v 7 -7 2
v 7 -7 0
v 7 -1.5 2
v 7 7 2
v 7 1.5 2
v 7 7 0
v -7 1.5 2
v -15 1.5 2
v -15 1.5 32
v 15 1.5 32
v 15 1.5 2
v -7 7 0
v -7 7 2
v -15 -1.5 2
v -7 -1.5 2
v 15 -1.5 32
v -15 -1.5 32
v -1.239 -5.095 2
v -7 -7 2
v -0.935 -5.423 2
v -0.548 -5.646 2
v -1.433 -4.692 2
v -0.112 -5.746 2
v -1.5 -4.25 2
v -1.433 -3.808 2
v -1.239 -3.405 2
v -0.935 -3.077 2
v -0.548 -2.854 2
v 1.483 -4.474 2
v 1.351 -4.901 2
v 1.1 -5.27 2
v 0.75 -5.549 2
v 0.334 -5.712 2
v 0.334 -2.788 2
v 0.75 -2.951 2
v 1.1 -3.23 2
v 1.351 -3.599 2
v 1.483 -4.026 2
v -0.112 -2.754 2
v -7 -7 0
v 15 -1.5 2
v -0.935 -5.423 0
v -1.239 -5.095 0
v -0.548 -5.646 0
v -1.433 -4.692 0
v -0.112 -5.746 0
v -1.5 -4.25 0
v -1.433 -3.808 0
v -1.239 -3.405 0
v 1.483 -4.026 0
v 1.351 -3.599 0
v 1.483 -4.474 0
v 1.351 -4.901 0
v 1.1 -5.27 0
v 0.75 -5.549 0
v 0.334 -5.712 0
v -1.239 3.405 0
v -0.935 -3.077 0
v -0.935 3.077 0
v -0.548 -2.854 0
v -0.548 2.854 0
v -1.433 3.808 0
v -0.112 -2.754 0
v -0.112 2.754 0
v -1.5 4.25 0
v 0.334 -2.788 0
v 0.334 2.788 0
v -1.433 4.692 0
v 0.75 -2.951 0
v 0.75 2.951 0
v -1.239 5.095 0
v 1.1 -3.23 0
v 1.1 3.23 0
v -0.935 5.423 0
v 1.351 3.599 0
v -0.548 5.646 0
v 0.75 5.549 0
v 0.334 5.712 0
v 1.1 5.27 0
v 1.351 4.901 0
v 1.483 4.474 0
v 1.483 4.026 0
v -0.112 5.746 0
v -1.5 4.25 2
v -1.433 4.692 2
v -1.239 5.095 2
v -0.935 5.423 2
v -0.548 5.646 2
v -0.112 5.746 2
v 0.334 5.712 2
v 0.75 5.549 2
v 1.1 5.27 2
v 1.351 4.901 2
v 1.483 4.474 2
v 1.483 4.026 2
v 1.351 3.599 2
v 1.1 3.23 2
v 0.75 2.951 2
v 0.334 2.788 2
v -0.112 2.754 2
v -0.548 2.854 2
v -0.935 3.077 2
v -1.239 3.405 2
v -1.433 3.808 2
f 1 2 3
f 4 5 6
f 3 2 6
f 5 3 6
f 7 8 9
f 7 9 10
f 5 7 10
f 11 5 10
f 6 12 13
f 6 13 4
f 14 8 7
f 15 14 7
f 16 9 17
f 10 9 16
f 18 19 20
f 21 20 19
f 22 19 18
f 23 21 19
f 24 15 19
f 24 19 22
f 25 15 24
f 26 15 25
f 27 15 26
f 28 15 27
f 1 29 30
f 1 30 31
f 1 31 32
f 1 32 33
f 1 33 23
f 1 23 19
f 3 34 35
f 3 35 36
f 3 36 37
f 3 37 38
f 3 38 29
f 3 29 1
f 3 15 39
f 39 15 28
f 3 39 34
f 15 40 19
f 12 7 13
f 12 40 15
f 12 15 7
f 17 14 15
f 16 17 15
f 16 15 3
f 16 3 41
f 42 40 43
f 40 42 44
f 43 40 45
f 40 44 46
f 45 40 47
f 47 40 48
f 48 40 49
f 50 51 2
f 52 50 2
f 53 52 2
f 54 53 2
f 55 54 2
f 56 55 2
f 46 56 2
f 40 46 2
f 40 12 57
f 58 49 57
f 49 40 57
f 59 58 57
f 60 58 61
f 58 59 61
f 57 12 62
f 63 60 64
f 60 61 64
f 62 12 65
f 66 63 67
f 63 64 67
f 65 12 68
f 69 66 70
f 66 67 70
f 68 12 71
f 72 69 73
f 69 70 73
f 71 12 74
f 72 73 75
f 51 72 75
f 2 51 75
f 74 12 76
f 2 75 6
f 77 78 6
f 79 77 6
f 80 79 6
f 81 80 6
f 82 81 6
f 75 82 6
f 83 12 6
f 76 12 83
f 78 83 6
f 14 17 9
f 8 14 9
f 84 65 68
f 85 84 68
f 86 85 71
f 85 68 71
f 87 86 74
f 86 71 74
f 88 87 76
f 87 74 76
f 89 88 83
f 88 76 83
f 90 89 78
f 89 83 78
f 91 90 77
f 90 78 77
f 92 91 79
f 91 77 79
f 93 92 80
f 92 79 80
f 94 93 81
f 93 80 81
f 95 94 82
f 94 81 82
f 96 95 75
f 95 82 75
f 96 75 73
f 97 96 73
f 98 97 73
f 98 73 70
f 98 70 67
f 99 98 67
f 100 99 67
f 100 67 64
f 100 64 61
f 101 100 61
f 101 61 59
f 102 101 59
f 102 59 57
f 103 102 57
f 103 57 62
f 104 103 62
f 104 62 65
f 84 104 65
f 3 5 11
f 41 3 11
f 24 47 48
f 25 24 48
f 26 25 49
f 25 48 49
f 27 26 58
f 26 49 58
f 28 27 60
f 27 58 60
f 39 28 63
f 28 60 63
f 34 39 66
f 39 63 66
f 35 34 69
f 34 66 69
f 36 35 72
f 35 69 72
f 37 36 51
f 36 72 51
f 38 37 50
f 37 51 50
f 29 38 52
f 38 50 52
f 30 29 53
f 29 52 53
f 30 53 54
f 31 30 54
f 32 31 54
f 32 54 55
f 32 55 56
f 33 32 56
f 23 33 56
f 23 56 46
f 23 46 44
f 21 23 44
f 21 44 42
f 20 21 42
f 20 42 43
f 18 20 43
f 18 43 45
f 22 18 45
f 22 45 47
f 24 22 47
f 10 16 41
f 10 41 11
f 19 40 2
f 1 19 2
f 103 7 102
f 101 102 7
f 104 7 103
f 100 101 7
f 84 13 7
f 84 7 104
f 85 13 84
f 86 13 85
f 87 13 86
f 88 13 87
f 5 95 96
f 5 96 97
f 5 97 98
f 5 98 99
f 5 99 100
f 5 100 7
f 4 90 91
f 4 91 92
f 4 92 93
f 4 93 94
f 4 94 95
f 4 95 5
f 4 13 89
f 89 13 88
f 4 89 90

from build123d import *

# Parameters (mm, degrees)
SKETCH1_W             = 14
SKETCH1_H             = 14
BOSS_EXTRUDE1_DEPTH   = 2
SKETCH2_W             = 30
SKETCH2_H             = 3
BOSS_EXTRUDE2_DEPTH   = 30
F_3_0MM_DOWEL_HOLE1_D = 3


with BuildPart() as part:
    # Sketch1 → Boss-Extrude1 (new body)
    with BuildSketch(Plane.XY):
        Rectangle(SKETCH1_W, SKETCH1_H)
    extrude(amount=BOSS_EXTRUDE1_DEPTH)

    # Sketch2 → Boss-Extrude2 (add)
    with BuildSketch(Plane.XY.offset(2)):
        Rectangle(SKETCH2_W, SKETCH2_H)
    extrude(amount=BOSS_EXTRUDE2_DEPTH)

    # Ø3.0mm Dowel Hole1 (through all)
    with Locations(Plane.XY.offset(2)):
        with Locations((0, -4.25), (0, 4.25)):
            Hole(F_3_0MM_DOWEL_HOLE1_D / 2)


solid = part.part
